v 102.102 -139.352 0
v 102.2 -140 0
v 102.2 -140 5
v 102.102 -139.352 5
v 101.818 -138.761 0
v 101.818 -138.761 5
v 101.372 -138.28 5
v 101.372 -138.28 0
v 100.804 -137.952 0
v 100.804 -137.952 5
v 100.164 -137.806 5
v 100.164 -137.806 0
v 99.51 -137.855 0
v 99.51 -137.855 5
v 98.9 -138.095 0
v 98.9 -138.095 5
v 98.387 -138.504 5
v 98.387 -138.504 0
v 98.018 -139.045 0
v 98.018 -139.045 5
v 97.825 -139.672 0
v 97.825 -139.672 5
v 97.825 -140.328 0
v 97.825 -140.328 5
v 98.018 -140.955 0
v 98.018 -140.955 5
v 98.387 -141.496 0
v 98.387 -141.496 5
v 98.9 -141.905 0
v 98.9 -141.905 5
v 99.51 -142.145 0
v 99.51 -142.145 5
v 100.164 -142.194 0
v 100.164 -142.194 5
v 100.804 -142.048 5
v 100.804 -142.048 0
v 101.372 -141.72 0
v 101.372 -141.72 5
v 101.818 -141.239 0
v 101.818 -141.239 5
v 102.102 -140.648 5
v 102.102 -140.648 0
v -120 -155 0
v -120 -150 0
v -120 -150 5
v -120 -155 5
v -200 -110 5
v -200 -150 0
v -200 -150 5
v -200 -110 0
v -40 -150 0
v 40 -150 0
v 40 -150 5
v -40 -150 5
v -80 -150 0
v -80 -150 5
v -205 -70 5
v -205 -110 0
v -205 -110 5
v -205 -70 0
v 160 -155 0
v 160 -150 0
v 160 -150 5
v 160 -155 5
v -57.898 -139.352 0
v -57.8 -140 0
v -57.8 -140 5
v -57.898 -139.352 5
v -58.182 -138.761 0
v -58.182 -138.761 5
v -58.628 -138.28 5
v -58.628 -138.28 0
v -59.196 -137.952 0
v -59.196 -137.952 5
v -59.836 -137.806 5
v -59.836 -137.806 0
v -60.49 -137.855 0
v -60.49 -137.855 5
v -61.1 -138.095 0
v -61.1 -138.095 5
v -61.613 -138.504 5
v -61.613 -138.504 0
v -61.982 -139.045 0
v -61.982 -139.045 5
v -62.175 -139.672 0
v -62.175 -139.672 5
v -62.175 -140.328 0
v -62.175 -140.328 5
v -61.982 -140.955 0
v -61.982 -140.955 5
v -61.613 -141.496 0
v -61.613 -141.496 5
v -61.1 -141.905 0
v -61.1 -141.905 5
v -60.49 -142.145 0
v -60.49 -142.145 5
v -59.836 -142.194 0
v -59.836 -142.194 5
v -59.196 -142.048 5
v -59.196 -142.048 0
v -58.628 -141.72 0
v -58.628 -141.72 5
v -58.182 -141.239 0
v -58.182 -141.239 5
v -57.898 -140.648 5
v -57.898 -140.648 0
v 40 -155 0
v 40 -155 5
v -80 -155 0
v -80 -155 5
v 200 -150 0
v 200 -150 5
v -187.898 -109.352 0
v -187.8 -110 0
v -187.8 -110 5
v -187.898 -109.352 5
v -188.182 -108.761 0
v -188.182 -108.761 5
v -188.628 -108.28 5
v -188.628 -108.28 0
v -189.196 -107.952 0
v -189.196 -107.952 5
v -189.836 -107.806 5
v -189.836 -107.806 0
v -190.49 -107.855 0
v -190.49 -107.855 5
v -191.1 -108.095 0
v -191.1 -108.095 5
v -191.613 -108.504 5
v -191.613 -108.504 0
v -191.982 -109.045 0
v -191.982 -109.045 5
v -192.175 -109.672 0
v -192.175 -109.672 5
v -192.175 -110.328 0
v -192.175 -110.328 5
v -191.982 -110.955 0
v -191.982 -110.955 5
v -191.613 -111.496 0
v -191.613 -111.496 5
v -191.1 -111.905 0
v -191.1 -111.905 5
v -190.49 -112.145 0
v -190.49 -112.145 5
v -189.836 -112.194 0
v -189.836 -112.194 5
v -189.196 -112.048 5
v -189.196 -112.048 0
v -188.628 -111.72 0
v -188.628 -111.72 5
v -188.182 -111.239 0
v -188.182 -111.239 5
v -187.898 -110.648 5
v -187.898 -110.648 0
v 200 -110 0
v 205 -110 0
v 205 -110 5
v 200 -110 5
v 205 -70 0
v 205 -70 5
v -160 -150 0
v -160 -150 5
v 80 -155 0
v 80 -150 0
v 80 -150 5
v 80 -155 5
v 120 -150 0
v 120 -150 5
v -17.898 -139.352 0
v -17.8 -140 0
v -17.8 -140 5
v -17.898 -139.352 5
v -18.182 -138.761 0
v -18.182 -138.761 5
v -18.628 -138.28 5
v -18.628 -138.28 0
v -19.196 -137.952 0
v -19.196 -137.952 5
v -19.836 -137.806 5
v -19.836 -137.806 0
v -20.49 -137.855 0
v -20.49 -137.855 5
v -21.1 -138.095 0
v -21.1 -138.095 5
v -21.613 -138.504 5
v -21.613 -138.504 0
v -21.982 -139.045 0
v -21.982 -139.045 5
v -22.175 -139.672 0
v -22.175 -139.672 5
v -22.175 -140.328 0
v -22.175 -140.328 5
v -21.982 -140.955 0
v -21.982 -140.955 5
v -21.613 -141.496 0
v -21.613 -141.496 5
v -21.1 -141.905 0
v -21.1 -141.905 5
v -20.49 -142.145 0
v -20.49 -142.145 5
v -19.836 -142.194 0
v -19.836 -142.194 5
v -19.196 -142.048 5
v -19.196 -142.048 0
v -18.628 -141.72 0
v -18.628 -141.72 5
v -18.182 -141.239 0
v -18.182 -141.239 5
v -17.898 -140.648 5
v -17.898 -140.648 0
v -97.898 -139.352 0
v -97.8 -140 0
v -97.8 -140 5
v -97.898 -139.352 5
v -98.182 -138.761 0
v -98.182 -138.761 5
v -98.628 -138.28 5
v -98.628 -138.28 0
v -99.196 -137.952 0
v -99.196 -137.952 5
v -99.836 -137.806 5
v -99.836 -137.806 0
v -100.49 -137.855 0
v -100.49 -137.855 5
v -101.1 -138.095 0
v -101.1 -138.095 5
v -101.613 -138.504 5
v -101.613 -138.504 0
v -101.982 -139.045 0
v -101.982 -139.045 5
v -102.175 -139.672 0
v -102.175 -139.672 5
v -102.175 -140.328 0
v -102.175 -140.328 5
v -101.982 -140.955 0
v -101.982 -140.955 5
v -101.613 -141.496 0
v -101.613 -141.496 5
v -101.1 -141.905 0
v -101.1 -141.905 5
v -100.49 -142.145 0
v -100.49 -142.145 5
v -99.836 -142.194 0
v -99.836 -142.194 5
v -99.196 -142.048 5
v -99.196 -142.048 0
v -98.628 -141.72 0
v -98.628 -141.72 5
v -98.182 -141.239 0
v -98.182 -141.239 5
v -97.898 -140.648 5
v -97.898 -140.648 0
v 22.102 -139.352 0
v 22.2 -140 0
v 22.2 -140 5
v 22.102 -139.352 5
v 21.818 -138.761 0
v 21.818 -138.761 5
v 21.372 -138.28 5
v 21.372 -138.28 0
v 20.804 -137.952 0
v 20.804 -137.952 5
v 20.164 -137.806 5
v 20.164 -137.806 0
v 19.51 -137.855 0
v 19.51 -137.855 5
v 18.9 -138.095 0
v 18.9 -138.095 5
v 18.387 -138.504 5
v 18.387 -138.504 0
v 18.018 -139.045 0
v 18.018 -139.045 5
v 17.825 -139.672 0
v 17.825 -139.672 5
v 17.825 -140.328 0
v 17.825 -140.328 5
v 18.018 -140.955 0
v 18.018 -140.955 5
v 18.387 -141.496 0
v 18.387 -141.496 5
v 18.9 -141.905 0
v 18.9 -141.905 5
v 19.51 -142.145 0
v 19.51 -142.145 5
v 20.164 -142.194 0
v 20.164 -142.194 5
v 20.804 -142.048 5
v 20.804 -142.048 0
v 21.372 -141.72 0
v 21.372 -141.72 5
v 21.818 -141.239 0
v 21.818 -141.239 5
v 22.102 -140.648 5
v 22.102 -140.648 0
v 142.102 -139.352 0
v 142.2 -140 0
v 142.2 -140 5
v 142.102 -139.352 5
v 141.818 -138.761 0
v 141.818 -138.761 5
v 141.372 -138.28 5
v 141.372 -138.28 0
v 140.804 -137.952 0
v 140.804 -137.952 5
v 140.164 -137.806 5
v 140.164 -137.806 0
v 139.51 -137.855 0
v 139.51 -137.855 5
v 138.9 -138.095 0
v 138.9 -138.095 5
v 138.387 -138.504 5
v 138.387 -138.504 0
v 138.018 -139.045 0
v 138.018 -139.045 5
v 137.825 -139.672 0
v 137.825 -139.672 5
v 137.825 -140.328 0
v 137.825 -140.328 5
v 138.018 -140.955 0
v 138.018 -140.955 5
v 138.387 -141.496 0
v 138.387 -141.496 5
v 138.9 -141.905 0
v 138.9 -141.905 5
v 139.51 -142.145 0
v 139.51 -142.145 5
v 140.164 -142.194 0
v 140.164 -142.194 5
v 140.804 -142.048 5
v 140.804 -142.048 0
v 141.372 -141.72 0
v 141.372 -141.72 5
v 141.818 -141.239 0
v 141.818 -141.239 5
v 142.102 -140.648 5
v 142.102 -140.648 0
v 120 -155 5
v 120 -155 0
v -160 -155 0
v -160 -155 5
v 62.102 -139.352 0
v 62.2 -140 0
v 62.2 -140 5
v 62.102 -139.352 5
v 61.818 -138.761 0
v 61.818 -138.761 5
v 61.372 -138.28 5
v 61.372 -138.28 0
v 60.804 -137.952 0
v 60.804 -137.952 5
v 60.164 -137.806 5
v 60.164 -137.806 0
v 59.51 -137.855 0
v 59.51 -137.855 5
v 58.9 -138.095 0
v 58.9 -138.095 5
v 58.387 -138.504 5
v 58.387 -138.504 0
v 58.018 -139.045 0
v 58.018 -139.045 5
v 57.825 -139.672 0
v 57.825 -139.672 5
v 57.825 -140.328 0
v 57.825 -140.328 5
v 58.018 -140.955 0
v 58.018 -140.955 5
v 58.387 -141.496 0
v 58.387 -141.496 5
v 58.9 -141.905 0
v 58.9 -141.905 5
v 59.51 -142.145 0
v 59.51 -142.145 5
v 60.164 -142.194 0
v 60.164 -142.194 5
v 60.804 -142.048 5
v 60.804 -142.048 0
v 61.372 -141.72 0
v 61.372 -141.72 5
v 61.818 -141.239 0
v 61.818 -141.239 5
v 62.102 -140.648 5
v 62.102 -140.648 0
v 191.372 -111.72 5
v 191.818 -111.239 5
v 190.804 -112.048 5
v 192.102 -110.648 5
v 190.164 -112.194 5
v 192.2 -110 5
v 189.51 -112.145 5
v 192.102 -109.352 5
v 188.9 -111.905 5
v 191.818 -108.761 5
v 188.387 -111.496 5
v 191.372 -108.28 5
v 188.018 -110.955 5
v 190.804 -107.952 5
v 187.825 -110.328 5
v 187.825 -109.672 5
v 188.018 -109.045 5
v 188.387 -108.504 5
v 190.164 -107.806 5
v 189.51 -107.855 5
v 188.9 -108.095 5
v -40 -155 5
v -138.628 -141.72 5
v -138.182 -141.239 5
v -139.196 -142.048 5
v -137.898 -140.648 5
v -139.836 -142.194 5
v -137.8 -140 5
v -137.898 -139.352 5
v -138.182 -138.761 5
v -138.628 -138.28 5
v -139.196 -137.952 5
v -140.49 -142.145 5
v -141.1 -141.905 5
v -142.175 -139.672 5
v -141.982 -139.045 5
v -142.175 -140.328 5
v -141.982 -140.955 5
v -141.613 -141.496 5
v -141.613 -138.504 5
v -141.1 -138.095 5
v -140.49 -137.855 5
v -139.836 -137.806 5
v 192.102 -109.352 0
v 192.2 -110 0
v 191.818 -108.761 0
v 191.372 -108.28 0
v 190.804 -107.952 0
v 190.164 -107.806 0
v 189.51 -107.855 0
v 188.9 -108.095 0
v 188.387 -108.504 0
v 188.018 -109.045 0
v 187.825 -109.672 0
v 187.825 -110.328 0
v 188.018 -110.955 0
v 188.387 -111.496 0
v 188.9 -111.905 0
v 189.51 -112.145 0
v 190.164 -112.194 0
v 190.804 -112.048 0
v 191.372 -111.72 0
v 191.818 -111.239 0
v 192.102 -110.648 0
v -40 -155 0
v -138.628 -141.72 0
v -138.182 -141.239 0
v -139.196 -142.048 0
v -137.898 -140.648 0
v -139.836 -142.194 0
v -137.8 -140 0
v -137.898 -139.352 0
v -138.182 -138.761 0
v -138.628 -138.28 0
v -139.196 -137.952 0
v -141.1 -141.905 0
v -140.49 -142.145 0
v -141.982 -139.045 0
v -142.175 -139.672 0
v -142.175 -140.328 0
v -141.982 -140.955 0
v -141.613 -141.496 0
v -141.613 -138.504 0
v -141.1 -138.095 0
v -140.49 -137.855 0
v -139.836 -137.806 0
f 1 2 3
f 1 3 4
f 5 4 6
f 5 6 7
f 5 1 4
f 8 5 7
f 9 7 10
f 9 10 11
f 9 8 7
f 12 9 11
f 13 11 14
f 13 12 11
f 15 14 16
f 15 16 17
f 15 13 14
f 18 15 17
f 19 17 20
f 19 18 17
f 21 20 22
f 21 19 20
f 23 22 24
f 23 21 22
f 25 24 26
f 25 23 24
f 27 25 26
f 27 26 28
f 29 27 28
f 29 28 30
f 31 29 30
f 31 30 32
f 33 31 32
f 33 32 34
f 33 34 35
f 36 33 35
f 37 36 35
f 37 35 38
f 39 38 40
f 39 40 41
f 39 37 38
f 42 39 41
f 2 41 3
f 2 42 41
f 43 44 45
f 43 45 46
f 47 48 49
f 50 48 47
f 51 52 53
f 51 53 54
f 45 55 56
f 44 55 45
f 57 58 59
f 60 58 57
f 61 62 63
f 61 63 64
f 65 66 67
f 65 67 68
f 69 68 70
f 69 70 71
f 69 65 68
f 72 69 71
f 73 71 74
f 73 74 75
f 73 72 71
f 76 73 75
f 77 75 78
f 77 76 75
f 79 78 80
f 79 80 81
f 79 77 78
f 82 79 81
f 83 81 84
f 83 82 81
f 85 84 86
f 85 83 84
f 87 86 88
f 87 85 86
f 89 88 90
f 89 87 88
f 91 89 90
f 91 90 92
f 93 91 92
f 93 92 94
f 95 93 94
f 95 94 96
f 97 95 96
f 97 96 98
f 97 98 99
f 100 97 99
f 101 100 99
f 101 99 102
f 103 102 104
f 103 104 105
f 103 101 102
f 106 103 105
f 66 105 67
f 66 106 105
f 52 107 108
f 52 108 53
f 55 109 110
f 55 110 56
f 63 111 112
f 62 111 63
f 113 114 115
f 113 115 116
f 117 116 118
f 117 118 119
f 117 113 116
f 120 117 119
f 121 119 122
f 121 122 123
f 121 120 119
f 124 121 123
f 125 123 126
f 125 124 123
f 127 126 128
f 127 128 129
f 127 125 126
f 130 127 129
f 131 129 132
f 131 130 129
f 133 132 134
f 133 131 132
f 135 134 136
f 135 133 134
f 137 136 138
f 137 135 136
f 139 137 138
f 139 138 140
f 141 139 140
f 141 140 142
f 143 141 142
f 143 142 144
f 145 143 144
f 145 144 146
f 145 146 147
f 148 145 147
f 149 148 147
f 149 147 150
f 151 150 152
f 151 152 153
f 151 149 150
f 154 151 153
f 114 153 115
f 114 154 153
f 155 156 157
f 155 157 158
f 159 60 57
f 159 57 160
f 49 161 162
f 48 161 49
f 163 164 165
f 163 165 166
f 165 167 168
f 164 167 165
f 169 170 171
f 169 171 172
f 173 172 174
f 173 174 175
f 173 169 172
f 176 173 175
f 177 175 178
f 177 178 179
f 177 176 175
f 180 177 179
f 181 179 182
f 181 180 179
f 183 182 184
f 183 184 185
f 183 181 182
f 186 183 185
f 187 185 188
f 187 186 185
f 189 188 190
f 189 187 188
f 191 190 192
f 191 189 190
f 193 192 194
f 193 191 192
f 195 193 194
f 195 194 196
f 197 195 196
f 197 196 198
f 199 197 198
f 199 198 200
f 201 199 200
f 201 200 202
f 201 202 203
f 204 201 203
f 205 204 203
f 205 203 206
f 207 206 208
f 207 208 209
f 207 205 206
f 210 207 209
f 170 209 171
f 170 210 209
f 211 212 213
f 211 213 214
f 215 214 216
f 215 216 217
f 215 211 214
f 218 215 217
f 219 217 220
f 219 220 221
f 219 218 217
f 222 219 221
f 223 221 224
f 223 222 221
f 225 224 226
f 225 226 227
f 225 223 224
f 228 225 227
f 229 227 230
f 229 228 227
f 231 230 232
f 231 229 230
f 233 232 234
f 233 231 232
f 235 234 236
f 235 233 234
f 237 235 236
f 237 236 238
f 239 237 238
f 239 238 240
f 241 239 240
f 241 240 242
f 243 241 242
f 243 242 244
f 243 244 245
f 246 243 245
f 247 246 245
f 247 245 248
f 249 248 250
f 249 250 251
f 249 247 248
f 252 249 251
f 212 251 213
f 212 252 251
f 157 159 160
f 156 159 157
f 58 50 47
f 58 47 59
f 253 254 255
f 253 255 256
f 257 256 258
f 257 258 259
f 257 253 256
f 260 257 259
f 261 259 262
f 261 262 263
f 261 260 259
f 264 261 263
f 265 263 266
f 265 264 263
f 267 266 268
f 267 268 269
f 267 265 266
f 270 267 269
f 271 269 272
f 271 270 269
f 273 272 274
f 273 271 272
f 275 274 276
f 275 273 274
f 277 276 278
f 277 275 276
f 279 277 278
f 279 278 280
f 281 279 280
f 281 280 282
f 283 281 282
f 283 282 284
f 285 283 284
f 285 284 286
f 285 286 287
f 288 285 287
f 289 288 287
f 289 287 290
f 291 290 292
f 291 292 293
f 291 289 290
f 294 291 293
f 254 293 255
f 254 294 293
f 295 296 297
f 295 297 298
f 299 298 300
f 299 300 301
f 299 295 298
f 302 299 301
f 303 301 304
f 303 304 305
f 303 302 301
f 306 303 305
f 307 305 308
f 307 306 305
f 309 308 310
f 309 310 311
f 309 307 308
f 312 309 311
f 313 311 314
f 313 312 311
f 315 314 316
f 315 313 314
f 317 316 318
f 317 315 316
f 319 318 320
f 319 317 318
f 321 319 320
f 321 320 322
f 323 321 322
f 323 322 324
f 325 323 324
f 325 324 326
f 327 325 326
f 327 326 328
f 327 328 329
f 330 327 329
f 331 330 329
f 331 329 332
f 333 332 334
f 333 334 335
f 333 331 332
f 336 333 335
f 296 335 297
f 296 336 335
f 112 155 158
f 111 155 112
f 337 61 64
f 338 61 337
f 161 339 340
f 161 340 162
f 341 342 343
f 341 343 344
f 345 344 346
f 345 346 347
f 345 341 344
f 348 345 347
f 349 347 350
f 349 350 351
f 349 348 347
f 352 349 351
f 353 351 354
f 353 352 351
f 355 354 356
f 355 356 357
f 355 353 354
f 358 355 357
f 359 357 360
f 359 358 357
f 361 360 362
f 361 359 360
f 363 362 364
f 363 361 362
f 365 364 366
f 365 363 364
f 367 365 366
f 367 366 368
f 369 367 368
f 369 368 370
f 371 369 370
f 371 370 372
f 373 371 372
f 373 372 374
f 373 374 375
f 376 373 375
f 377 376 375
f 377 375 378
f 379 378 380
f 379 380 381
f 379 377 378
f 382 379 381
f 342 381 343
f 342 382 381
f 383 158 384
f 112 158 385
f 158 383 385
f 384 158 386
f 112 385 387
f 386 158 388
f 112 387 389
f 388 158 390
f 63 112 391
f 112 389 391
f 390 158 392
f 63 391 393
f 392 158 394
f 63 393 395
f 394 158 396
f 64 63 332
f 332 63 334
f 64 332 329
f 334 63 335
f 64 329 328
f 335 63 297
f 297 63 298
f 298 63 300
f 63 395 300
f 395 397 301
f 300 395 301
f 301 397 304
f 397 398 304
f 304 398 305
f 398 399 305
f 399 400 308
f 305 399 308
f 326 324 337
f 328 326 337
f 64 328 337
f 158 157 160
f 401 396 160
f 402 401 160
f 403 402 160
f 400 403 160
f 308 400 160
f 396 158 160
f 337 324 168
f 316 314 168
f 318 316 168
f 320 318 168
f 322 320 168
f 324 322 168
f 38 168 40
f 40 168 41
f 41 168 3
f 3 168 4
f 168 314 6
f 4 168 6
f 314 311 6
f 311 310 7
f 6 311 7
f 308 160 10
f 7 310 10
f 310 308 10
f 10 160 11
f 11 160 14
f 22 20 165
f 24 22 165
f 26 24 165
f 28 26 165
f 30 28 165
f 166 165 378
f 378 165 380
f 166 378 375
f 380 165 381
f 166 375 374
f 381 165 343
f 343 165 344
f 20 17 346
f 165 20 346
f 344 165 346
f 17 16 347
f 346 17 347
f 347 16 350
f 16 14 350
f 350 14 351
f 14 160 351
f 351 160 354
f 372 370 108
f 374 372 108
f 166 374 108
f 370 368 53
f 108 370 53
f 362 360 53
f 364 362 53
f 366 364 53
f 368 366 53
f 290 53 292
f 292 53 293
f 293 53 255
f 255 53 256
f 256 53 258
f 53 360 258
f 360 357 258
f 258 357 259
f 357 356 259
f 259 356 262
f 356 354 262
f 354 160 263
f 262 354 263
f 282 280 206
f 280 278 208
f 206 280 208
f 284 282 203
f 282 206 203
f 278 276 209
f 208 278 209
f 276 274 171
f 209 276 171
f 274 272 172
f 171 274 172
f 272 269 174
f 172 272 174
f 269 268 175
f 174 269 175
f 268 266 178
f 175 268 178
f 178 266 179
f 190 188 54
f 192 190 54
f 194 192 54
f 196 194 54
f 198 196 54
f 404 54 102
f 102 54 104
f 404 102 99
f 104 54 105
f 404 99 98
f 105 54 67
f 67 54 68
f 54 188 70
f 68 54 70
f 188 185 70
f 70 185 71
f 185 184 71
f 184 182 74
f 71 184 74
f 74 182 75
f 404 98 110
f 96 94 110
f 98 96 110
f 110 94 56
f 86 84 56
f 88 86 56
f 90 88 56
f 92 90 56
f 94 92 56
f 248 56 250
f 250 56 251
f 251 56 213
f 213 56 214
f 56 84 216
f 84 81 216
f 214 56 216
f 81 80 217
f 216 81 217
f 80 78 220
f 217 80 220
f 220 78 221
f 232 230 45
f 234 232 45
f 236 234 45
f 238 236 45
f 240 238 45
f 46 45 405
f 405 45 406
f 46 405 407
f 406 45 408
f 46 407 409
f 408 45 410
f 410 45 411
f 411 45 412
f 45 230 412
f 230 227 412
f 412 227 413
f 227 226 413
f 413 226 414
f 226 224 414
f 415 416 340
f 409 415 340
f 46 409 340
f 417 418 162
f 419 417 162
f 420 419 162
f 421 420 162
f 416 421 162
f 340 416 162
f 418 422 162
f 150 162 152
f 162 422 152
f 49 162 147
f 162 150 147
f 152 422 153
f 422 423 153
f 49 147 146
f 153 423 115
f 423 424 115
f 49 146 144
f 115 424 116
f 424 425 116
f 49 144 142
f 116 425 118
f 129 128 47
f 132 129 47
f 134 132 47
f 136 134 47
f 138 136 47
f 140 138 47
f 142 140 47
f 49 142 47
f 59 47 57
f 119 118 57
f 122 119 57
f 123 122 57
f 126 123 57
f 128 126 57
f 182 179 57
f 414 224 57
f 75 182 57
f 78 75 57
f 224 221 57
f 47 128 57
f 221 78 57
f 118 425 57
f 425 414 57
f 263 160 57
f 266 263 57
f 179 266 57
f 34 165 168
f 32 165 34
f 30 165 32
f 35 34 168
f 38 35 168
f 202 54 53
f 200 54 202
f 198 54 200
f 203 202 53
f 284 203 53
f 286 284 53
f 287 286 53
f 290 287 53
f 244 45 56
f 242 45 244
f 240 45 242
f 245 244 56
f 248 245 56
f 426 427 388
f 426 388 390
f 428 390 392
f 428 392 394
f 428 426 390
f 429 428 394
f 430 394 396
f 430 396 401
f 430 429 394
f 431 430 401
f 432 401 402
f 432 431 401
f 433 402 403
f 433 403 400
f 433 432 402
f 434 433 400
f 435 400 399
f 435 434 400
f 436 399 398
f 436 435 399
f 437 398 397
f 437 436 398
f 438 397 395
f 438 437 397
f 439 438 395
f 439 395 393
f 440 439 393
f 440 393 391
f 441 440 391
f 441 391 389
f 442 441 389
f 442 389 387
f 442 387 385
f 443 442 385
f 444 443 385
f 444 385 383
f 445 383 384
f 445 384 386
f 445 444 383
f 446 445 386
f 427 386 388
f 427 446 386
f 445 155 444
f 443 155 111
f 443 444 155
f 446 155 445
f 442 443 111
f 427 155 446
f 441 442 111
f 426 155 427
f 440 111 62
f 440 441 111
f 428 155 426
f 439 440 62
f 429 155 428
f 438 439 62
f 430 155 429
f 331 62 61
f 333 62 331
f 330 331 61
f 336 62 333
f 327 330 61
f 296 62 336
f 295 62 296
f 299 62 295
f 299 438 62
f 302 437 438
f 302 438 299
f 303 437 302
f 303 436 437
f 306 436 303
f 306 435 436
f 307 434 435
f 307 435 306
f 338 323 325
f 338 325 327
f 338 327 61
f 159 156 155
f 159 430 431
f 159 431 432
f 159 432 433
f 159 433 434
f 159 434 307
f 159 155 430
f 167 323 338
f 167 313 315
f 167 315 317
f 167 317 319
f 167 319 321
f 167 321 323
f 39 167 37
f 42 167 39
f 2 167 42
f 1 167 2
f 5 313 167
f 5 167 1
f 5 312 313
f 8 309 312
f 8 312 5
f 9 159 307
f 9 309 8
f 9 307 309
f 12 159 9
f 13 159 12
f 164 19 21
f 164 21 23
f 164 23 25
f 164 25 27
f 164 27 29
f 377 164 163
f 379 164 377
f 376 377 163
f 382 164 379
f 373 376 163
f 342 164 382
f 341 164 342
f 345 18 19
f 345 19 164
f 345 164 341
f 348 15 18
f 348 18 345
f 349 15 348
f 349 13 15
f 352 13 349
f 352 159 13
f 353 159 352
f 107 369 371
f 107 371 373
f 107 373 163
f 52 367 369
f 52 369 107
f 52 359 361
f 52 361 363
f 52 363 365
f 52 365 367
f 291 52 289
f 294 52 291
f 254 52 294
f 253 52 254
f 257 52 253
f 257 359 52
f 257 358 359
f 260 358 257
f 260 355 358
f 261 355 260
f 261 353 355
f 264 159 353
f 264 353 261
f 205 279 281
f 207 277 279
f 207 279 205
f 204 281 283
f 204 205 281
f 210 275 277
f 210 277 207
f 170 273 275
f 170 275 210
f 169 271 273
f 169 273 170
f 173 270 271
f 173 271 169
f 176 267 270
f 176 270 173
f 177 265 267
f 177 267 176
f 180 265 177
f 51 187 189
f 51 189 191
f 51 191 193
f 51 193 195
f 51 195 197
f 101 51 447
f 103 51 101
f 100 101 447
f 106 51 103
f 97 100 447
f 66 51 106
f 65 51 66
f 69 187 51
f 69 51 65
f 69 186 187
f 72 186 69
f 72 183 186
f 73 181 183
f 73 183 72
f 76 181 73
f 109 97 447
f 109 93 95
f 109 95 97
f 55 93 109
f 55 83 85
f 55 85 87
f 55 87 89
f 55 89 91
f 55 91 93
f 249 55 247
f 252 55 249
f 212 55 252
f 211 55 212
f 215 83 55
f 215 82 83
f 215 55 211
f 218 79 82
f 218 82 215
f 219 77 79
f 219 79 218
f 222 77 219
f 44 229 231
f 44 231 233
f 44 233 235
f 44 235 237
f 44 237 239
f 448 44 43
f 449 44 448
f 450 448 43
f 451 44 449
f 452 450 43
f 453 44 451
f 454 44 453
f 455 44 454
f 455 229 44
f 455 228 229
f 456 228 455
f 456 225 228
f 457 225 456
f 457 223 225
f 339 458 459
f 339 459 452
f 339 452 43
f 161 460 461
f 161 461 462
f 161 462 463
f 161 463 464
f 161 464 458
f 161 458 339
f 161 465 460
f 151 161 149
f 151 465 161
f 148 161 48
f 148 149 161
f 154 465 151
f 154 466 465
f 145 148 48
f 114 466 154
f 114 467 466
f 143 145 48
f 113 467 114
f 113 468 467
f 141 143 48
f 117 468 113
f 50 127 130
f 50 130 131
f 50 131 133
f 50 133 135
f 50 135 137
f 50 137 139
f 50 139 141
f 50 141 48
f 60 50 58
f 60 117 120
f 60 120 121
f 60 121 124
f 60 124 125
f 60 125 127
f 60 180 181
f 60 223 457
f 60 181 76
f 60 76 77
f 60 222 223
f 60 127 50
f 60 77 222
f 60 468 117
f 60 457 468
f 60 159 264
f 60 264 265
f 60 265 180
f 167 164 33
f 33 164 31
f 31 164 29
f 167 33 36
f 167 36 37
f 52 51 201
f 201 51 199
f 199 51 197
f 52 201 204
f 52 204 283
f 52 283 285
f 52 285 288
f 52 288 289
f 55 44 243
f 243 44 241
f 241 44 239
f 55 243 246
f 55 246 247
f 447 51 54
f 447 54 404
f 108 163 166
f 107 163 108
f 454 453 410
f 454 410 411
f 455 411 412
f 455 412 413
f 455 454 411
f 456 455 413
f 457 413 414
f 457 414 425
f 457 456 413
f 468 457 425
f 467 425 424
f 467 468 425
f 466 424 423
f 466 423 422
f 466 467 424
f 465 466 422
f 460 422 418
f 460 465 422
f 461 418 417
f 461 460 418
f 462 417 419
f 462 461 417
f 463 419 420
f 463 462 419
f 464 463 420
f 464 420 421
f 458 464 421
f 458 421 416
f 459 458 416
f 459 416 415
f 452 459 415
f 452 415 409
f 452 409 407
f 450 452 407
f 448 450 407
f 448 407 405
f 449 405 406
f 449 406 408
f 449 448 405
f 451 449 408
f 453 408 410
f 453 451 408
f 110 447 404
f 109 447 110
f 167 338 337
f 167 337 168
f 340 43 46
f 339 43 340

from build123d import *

# Parameters (mm, degrees)
SKETCH_1_R          = 2.2
EXTRUDE_1_DEPTH     = 5
SKETCH_2_W          = 410
SKETCH_2_H          = 226.105378696
CUT_EXTRUDE_2_DEPTH = 5
SKETCH_4_W          = 410
SKETCH_4_H          = 19.486670542
EXTRUDE_3_DEPTH     = 5


with BuildPart() as part:
    # 草图1 → 凸台-拉伸1 (new body)
    with BuildSketch(Plane.XY):
        Polygon((-200, 150), (200, 150), (200, 110), (205, 110), (205, 70), (200, 70), (200, 30), (205, 30), (205, -30), (200, -30), (200, -70), (205, -70), (205, -110), (200, -110), (200, -150), (160, -150), (160, -155), (120, -155), (120, -150), (80, -150), (80, -155), (40, -155), (40, -150), (-40, -150), (-40, -155), (-80, -155), (-80, -150), (-120, -150), (-120, -155), (-160, -155), (-160, -150), (-200, -150), (-200, -110), (-205, -110), (-205, -70), (-200, -70), (-200, -30), (-205, -30), (-205, 30), (-200, 30), (-200, 70), (-205, 70), (-205, 110), (-200, 110), align=None)
        with Locations((-140, -140)):
            Circle(SKETCH_1_R, mode=Mode.SUBTRACT)
        with Locations((-100, -140)):
            Circle(SKETCH_1_R, mode=Mode.SUBTRACT)
        with Locations((-60, -140)):
            Circle(SKETCH_1_R, mode=Mode.SUBTRACT)
        with Locations((-20, -140)):
            Circle(SKETCH_1_R, mode=Mode.SUBTRACT)
        with Locations((20, -140)):
            Circle(SKETCH_1_R, mode=Mode.SUBTRACT)
        with Locations((60, -140)):
            Circle(SKETCH_1_R, mode=Mode.SUBTRACT)
        with Locations((100, -140)):
            Circle(SKETCH_1_R, mode=Mode.SUBTRACT)
        with Locations((140, -140)):
            Circle(SKETCH_1_R, mode=Mode.SUBTRACT)
        with Locations((-190, 110)):
            Circle(SKETCH_1_R, mode=Mode.SUBTRACT)
        with Locations((-190, 70)):
            Circle(SKETCH_1_R, mode=Mode.SUBTRACT)
        with Locations((-190, 30)):
            Circle(SKETCH_1_R, mode=Mode.SUBTRACT)
        with Locations((-190, -30)):
            Circle(SKETCH_1_R, mode=Mode.SUBTRACT)
        with Locations((-190, -70)):
            Circle(SKETCH_1_R, mode=Mode.SUBTRACT)
        with Locations((-190, -110)):
            Circle(SKETCH_1_R, mode=Mode.SUBTRACT)
        with Locations((190, -110)):
            Circle(SKETCH_1_R, mode=Mode.SUBTRACT)
        with Locations((190, -70)):
            Circle(SKETCH_1_R, mode=Mode.SUBTRACT)
        with Locations((190, -30)):
            Circle(SKETCH_1_R, mode=Mode.SUBTRACT)
        with Locations((190, 30)):
            Circle(SKETCH_1_R, mode=Mode.SUBTRACT)
        with Locations((190, 70)):
            Circle(SKETCH_1_R, mode=Mode.SUBTRACT)
        with Locations((190, 110)):
            Circle(SKETCH_1_R, mode=Mode.SUBTRACT)
    extrude(amount=EXTRUDE_1_DEPTH)

    # 草图2 → 切除-拉伸2 (cut)
    with BuildSketch(Plane.XY.offset(5)):
        with Locations((0, 43.052689348)):
            Rectangle(SKETCH_2_W, SKETCH_2_H)
    extrude(amount=-CUT_EXTRUDE_2_DEPTH, mode=Mode.SUBTRACT)

    # 草图4 → 凸台-拉伸3 (add)
    with BuildSketch(Plane.XY.offset(5)):
        with Locations((0, -79.743335271)):
            Rectangle(SKETCH_4_W, SKETCH_4_H)
    extrude(amount=-EXTRUDE_3_DEPTH)


solid = part.part
